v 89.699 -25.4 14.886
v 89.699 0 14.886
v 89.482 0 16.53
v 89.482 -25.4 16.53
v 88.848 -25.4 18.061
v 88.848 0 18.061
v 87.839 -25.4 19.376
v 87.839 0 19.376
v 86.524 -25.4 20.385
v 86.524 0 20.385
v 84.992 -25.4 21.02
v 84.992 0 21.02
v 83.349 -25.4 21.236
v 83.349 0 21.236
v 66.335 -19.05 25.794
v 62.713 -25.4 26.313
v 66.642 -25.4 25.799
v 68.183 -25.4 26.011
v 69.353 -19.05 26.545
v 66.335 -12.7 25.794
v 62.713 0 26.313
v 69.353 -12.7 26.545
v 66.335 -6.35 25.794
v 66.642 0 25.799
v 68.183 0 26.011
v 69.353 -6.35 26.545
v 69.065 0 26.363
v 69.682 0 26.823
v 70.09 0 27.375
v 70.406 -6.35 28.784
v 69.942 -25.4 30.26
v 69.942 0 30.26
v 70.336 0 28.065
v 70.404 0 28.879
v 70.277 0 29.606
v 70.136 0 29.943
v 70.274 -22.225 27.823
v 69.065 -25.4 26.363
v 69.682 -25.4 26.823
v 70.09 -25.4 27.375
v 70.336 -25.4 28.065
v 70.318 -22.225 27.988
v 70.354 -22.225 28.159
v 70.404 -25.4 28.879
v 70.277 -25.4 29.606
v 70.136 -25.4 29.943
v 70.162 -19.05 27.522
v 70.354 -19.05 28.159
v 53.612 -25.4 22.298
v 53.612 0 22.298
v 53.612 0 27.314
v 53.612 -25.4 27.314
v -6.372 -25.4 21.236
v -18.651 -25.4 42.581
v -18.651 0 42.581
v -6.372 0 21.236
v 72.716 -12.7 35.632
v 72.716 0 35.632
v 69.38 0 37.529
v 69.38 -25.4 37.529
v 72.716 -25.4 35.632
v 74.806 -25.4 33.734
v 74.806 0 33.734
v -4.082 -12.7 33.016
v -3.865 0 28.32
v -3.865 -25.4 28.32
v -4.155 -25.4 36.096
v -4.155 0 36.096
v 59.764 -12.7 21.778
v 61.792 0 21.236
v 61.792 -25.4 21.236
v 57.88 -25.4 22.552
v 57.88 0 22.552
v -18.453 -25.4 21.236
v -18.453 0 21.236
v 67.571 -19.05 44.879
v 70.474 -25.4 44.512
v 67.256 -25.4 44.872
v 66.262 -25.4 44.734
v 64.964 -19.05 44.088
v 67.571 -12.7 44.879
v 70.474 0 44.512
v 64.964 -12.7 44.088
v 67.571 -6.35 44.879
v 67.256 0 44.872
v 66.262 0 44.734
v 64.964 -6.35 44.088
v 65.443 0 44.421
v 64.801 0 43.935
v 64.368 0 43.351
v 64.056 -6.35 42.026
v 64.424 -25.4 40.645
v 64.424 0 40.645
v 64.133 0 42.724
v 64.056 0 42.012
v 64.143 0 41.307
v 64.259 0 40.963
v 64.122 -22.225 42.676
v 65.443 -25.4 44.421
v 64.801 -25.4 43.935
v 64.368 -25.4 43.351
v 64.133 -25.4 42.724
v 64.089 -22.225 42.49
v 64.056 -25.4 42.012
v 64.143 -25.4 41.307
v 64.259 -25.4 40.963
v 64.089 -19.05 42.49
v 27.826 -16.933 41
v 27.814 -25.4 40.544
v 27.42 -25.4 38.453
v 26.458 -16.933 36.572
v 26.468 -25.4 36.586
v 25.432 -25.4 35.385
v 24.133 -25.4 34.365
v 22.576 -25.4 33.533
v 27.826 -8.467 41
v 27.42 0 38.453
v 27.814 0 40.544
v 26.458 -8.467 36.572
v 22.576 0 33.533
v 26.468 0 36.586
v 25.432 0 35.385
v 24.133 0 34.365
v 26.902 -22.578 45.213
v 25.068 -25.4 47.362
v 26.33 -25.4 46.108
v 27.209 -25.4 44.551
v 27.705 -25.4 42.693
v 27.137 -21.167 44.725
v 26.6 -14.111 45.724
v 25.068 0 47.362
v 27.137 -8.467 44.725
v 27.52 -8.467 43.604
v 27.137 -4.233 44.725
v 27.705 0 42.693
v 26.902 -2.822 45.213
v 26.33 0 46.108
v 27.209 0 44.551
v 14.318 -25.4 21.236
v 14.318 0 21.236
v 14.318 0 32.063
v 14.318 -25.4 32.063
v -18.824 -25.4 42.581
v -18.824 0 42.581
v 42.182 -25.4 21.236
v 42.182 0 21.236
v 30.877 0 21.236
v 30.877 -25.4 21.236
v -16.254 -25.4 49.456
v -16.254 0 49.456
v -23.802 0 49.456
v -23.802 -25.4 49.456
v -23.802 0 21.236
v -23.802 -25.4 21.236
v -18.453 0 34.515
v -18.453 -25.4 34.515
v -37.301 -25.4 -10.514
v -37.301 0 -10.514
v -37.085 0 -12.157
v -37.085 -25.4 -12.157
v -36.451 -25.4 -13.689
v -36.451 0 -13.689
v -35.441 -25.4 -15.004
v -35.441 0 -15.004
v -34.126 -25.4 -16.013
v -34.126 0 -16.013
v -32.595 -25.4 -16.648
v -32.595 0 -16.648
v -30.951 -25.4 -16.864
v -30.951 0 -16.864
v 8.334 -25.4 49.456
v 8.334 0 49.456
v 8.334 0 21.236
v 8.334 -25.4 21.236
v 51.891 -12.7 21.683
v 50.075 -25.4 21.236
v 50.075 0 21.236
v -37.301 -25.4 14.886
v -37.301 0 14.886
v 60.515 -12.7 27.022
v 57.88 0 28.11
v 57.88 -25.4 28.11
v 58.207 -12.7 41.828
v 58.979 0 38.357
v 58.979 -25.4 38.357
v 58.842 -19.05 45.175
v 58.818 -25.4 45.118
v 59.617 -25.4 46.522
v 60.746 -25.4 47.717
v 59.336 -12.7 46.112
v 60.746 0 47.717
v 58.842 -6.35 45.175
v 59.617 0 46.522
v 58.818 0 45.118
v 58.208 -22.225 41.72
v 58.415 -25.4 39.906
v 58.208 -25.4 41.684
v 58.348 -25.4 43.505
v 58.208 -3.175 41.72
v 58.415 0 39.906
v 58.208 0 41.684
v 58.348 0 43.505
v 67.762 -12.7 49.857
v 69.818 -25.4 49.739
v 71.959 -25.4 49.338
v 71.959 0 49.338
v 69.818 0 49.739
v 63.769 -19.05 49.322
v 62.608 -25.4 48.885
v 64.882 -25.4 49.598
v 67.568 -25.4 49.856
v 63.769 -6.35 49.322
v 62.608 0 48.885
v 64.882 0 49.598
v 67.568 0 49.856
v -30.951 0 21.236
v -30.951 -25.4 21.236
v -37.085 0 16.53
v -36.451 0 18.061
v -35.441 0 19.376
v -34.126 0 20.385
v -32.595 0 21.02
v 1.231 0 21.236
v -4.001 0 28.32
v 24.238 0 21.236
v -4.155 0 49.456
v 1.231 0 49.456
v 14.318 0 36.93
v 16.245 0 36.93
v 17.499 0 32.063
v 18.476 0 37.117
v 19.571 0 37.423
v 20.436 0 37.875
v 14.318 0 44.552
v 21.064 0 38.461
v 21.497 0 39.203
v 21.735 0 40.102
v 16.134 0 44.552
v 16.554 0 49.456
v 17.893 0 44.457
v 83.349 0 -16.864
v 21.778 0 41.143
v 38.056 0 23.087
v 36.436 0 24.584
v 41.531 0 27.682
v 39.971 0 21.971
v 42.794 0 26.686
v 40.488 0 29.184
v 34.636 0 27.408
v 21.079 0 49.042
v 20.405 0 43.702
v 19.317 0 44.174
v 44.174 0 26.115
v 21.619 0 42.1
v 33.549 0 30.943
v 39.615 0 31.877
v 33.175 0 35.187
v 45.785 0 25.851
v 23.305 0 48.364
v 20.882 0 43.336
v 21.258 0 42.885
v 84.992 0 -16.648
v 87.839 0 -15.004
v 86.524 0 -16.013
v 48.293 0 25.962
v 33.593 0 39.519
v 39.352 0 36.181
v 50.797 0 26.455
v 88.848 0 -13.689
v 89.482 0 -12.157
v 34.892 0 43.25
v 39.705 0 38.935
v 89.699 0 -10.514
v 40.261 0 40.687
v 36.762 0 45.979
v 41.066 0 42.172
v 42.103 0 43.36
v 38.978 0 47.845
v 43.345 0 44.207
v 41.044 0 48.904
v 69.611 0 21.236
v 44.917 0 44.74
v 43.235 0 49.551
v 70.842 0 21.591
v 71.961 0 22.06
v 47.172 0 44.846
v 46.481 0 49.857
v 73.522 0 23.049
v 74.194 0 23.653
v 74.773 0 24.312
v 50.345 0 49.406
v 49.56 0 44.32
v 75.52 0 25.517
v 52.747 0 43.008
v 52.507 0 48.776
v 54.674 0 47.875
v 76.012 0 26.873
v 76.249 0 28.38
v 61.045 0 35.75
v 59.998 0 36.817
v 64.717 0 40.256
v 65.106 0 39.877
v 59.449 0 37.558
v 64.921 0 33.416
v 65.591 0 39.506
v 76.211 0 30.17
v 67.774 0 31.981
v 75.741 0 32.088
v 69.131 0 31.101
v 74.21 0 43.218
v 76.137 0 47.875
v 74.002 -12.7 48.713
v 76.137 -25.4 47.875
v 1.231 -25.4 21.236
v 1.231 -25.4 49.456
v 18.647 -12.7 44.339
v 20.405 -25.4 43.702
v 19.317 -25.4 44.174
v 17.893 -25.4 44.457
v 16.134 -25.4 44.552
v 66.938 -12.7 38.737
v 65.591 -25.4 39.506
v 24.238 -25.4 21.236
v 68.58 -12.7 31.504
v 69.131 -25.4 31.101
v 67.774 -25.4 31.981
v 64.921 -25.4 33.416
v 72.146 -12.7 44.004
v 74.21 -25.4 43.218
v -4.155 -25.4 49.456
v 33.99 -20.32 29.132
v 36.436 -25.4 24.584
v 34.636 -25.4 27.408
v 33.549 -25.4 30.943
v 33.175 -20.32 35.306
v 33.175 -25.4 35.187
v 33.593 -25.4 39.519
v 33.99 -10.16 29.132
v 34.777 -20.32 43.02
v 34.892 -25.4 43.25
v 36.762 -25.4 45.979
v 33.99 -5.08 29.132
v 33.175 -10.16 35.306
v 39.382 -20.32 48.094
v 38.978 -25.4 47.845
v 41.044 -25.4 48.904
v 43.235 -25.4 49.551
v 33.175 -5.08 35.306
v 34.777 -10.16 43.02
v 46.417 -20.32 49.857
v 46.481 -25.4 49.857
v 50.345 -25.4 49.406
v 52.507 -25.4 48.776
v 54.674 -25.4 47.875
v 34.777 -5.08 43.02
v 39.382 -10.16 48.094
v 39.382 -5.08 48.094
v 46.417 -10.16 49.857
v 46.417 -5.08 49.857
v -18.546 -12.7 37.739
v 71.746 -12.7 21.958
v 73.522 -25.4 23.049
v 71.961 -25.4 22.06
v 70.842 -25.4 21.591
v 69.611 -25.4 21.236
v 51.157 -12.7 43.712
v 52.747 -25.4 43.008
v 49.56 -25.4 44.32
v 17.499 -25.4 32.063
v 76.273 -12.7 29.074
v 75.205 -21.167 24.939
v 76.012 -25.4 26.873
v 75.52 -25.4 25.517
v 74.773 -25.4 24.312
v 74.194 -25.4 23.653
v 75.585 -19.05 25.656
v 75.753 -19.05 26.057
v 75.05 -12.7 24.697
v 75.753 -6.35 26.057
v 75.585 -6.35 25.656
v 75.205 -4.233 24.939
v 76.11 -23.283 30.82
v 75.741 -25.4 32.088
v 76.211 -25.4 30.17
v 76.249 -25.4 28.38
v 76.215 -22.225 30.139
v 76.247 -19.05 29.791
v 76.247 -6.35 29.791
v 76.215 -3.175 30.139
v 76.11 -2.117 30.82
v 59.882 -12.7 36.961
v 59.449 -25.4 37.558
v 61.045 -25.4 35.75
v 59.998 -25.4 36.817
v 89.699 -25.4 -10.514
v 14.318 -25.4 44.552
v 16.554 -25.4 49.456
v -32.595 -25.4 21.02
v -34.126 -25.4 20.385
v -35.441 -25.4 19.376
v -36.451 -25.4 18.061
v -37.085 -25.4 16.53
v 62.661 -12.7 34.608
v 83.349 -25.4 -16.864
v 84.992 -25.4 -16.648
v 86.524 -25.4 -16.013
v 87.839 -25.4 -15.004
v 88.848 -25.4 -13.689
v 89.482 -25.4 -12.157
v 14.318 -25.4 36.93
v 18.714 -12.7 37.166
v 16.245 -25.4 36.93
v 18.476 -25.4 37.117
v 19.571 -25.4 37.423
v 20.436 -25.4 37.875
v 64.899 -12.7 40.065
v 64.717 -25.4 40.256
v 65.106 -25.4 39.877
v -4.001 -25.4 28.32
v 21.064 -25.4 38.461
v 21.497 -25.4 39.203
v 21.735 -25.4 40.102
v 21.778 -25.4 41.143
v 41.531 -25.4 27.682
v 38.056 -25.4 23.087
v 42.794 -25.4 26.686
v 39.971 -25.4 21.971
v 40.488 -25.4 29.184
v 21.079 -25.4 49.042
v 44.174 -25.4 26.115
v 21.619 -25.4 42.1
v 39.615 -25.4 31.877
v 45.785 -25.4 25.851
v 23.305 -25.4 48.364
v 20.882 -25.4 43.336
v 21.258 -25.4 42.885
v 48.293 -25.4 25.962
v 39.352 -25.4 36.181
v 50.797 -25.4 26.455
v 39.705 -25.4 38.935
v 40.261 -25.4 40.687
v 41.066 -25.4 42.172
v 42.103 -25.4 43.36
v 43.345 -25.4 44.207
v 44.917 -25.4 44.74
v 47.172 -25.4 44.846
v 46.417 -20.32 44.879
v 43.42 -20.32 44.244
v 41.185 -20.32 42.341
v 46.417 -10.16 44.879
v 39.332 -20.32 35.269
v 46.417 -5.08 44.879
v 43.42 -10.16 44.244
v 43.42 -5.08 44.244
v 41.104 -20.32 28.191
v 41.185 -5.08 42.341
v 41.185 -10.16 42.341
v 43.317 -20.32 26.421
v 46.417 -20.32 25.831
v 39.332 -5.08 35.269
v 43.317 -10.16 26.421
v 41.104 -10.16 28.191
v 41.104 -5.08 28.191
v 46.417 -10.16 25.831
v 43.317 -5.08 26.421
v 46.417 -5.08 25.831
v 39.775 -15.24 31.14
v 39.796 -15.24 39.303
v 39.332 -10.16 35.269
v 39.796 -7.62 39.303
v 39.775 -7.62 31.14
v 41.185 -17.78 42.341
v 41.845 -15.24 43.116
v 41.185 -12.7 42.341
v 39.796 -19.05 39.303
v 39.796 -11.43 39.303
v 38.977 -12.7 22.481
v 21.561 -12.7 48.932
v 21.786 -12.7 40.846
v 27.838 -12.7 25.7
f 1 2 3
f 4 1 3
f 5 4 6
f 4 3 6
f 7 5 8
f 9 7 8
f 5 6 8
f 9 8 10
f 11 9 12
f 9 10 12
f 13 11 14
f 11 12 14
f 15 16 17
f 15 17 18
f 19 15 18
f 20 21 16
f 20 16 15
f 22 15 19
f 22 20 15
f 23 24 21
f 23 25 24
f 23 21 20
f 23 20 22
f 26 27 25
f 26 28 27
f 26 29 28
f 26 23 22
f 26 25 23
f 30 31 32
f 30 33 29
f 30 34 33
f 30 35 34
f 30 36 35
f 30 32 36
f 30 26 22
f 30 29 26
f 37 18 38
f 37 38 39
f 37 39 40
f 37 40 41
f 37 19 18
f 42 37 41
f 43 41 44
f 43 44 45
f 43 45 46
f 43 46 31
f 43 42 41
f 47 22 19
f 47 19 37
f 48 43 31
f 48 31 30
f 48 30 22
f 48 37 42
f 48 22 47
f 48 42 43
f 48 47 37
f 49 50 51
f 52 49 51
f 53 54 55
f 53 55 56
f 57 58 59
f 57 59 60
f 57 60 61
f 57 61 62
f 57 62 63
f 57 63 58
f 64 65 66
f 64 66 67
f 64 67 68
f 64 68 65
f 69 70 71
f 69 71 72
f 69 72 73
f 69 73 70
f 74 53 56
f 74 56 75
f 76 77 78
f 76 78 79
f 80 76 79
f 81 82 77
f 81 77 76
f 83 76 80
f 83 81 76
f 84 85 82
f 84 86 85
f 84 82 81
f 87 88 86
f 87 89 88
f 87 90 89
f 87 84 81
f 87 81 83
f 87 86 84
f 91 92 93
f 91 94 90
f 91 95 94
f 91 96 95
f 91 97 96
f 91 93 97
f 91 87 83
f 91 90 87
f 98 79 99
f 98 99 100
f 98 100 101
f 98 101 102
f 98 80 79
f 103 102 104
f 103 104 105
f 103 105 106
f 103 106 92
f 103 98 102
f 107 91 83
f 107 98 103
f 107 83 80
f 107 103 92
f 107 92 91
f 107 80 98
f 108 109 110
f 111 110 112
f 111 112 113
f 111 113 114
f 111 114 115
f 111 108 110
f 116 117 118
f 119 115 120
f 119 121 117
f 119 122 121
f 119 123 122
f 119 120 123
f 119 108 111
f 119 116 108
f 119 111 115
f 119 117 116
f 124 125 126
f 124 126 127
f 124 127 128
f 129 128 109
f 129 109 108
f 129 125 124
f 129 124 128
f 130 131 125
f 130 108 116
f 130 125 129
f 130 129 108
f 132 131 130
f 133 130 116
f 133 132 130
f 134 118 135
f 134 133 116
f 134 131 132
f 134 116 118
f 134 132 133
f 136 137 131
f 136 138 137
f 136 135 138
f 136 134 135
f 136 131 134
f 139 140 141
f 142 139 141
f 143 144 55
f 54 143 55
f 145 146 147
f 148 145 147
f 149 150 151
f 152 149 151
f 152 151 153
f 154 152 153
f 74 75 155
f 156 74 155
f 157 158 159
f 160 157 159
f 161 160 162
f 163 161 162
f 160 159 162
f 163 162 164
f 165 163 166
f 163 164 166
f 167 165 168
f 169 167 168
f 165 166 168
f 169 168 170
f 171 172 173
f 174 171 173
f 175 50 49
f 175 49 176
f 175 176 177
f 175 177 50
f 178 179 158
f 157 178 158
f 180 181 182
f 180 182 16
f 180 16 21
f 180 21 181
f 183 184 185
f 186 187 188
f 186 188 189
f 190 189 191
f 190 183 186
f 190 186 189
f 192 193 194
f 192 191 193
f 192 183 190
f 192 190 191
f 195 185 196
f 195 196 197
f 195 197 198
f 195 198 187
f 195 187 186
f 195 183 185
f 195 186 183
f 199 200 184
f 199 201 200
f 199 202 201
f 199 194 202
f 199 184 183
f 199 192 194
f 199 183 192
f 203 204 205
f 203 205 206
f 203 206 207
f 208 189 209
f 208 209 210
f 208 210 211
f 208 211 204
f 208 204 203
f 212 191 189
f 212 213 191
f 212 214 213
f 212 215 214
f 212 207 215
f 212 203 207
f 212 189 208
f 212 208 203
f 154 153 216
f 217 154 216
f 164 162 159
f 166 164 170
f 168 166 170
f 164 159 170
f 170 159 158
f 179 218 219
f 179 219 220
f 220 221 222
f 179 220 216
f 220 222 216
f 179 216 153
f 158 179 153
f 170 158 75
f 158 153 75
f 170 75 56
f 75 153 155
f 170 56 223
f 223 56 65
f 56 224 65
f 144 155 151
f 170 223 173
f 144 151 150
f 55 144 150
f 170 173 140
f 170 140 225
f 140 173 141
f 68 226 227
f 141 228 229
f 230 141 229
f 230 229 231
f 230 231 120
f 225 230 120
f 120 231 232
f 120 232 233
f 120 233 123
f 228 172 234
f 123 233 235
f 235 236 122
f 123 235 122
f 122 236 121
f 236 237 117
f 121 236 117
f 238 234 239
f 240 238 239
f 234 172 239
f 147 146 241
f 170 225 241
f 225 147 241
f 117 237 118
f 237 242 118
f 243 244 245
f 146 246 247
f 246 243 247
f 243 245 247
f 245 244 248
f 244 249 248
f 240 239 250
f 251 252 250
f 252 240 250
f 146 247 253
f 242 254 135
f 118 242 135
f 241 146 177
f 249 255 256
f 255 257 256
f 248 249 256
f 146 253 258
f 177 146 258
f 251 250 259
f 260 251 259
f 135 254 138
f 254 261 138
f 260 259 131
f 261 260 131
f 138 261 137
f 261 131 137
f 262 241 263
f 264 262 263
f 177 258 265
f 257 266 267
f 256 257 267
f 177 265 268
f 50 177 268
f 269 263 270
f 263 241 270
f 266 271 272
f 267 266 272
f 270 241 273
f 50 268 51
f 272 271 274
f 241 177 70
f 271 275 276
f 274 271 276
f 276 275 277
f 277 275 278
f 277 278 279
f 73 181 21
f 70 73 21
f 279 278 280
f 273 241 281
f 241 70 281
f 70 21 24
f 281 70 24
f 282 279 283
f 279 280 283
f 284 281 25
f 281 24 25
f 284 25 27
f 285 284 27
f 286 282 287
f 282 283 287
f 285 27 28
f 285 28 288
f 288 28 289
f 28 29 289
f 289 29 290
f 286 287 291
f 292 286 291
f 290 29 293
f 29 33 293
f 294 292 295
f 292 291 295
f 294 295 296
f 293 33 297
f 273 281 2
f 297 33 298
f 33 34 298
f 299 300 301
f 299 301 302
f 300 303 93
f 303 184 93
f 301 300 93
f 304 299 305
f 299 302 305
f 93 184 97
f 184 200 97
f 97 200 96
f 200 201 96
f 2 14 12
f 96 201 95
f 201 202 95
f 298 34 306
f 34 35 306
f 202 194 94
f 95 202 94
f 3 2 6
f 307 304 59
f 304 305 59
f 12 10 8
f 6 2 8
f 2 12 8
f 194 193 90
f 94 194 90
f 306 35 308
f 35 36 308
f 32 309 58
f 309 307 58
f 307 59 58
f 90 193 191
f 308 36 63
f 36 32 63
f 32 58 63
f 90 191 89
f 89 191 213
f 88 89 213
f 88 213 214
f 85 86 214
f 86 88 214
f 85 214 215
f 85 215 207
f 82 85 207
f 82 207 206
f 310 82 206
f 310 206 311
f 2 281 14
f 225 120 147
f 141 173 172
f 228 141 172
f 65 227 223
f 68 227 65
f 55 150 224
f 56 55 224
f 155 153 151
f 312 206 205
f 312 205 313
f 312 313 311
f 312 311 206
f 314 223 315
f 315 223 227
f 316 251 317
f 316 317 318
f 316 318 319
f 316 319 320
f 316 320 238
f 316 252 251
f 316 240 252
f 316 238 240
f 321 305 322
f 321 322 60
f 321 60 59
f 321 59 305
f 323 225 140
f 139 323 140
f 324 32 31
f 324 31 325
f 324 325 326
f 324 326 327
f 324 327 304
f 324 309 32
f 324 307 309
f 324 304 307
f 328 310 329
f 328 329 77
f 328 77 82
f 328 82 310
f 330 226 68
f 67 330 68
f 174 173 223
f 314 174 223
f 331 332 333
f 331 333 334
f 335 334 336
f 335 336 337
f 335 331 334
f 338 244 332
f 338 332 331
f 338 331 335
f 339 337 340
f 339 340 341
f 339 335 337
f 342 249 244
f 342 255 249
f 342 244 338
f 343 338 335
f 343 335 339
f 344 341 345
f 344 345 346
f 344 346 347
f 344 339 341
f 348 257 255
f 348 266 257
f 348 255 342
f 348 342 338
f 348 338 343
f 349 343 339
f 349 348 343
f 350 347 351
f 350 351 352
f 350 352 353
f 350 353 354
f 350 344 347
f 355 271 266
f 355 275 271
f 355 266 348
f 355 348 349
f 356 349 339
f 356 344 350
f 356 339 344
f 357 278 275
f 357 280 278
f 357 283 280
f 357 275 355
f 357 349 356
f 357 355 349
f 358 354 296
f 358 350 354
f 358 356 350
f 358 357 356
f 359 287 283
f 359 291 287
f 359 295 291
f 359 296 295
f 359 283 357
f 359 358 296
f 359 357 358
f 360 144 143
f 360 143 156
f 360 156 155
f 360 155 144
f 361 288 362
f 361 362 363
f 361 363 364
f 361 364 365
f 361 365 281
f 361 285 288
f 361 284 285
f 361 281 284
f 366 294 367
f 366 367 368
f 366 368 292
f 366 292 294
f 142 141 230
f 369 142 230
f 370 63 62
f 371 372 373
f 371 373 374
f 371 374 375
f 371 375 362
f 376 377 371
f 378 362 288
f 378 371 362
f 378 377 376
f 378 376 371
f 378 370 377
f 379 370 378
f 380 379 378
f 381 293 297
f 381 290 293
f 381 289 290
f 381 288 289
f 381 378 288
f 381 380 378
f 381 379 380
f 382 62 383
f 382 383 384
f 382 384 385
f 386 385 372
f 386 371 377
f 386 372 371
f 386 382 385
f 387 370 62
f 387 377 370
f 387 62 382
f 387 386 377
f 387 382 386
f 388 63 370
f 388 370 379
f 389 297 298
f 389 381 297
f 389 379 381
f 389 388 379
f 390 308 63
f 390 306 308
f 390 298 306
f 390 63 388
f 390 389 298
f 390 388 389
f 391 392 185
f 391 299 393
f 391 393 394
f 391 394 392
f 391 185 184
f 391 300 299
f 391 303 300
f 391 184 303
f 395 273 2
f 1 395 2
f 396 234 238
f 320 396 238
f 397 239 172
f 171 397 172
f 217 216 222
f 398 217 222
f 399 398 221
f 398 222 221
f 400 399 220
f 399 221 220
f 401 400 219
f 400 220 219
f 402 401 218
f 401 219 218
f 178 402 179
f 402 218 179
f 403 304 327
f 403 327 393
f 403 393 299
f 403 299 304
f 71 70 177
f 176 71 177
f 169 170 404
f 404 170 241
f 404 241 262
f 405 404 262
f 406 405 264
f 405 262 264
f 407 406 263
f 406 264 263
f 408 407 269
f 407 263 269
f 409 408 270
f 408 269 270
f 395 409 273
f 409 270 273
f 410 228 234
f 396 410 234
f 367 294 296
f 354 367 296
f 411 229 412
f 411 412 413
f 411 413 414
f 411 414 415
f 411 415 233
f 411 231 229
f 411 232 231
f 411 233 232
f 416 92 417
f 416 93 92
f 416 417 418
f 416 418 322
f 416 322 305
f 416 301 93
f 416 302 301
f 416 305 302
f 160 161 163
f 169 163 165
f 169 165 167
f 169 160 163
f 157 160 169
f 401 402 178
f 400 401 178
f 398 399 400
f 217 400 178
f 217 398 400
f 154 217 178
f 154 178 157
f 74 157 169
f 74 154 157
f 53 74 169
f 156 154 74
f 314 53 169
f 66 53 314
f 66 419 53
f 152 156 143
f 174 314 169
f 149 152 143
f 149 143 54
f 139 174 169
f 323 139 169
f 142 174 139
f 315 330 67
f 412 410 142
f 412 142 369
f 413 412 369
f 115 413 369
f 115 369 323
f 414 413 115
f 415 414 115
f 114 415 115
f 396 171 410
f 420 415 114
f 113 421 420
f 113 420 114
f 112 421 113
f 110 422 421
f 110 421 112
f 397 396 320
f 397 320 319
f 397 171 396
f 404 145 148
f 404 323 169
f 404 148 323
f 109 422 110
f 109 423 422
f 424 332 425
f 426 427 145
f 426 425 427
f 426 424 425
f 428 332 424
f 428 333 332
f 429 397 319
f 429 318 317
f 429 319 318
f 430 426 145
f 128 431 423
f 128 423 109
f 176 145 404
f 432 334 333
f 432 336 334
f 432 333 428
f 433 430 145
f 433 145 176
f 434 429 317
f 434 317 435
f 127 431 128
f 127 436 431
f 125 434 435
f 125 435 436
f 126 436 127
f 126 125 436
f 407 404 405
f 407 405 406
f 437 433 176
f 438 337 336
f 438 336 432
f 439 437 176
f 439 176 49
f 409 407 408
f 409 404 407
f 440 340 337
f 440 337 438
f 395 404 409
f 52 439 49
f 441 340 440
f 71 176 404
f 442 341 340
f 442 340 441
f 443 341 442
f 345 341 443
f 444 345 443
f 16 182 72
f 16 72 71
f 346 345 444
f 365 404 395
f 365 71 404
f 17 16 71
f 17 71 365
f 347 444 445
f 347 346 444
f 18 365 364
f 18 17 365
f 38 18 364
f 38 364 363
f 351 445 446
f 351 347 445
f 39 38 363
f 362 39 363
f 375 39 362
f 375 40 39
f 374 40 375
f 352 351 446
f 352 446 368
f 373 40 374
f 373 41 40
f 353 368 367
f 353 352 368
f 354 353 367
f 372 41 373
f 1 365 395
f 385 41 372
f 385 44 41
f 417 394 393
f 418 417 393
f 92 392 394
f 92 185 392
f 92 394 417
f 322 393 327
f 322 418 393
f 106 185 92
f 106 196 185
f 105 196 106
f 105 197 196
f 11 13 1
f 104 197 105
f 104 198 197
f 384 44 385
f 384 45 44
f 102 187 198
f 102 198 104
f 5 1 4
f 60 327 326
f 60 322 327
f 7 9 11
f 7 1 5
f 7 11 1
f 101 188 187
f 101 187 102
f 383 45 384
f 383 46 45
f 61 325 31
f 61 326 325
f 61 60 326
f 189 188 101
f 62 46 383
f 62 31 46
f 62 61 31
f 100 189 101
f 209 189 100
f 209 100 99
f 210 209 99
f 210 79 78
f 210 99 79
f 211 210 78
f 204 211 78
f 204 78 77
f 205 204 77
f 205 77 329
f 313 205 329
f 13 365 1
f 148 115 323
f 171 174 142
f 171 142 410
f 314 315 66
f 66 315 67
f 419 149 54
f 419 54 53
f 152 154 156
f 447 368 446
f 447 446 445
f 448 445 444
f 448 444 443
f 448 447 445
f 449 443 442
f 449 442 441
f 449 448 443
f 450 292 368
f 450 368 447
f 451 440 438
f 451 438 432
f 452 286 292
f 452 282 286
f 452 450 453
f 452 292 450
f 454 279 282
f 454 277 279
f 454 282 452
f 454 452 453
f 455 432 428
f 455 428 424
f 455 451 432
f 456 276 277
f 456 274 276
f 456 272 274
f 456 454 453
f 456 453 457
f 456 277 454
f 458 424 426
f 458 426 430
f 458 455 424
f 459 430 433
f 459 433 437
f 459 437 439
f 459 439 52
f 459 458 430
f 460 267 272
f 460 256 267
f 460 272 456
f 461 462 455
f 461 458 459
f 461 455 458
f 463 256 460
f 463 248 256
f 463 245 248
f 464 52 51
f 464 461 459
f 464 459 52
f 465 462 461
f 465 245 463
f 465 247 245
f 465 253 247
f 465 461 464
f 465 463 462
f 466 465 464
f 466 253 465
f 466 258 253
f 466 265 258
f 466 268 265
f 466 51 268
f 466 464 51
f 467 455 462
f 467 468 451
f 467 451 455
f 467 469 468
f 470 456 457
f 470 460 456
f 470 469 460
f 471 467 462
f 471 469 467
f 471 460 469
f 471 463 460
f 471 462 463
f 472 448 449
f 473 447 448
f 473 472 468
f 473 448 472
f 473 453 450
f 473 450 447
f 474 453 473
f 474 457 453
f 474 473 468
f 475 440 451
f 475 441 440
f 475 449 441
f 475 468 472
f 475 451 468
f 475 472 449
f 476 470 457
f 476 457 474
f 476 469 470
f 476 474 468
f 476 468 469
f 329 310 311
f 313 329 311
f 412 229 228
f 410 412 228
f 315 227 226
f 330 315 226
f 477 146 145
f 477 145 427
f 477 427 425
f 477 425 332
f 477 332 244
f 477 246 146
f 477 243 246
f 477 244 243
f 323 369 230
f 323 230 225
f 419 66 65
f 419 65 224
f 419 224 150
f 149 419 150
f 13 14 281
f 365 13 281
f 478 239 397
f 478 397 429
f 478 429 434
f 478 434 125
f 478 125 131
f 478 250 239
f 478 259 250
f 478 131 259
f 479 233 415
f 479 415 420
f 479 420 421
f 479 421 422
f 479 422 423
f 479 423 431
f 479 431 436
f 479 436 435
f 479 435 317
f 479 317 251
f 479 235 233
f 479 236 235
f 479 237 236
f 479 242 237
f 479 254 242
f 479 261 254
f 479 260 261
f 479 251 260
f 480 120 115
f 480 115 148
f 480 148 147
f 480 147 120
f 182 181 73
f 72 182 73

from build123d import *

# Parameters (mm, degrees)
F1_DEPTH = 25.4


with BuildPart() as f1:
    # F0 (on Front) → F1 (new body)
    with BuildSketch(Plane.XZ):
        with BuildLine():
            ThreePointArc((-37.3012647021, -10.5139339946), (-35.4413927627, -15.0040620552), (-30.9512647021, -16.8639339946))
            Line((-30.9512647021, -16.8639339946), (83.3487352979, -16.8639339946))
            ThreePointArc((83.3487352979, -16.8639339946), (87.8388633584, -15.0040620552), (89.6987352979, -10.5139339946))
            Line((89.6987352979, -10.5139339946), (89.6987352979, 14.8860660054))
            ThreePointArc((89.6987352979, 14.8860660054), (87.8388633584, 19.3761940659), (83.3487352979, 21.2360660054))
            Line((83.3487352979, 21.2360660054), (69.6107378608, 21.2360660054))
            add(Edge.make_bspline(
                [(69.6107378608, 21.2360660054), (67.9310832834, 20.846957727), (65.8721436381, 20.846957727)],
                knots=[0.5796214889, 0.5796214889, 0.5796214889, 1, 1, 1], degree=2))
            add(Edge.make_bspline(
                [(65.8721436381, 20.846957727), (63.712128793, 20.846957727), (61.7917820904, 21.2360660054)],
                knots=[0, 0, 0, 0.477766543, 0.477766543, 0.477766543], degree=2))
            Line((61.7917820904, 21.2360660054), (50.0748208435, 21.2360660054))
            add(Edge.make_bspline(
                [(50.0748208435, 21.2360660054), (48.0740341098, 20.846957727), (45.8546844283, 20.846957727)],
                knots=[0.4822306436, 0.4822306436, 0.4822306436, 1, 1, 1], degree=2))
            add(Edge.make_bspline(
                [(45.8546844283, 20.846957727), (43.8675938375, 20.846957727), (42.1821425568, 21.2360660054)],
                knots=[0, 0, 0, 0.3226952609, 0.3226952609, 0.3226952609], degree=2))
            Line((42.1821425568, 21.2360660054), (30.8771038717, 21.2360660054))
            Line((30.8771038717, 21.2360660054), (24.2375578518, 21.2360660054))
            Line((24.2375578518, 21.2360660054), (14.3183849141, 21.2360660054))
            Line((14.3183849141, 21.2360660054), (8.3335290134, 21.2360660054))
            Line((8.3335290134, 21.2360660054), (1.2307588525, 21.2360660054))
            Line((1.2307588525, 21.2360660054), (-6.3722933805, 21.2360660054))
            Line((-6.3722933805, 21.2360660054), (-18.4531789759, 21.2360660054))
            Line((-18.4531789759, 21.2360660054), (-23.8018737231, 21.2360660054))
            Line((-23.8018737231, 21.2360660054), (-30.9512647021, 21.2360660054))
            ThreePointArc((-30.9512647021, 21.2360660054), (-35.4413927627, 19.3761940659), (-37.3012647021, 14.8860660054))
            Line((-37.3012647021, 14.8860660054), (-37.3012647021, -10.5139339946))
        make_face()
        with BuildLine():
            Line((-23.8018737231, 49.4556806705), (-23.8018737231, 21.2360660054))
            Line((-23.8018737231, 21.2360660054), (-18.4531789759, 21.2360660054))
            Line((-18.4531789759, 21.2360660054), (-18.4531789759, 34.5151580452))
            add(Edge.make_bspline(
                [(-18.8237582886, 42.5814344192), (-18.4531789759, 36.9300998999), (-18.4531789759, 34.5151580452)],
                knots=[0, 0, 0, 1, 1, 1], degree=2))
            Line((-18.8237582886, 42.5814344192), (-18.650821276, 42.5814344192))
            Line((-18.650821276, 42.5814344192), (-6.3722933805, 21.2360660054))
            Line((-6.3722933805, 21.2360660054), (1.2307588525, 21.2360660054))
            Line((1.2307588525, 21.2360660054), (1.2307588525, 49.4556806705))
            Line((1.2307588525, 49.4556806705), (-4.154993826, 49.4556806705))
            Line((-4.154993826, 49.4556806705), (-4.154993826, 36.0962964462))
            add(Edge.make_bspline(
                [(-3.8647066977, 28.3203072006), (-4.154993826, 33.8234099948), (-4.154993826, 36.0962964462)],
                knots=[0, 0, 0, 1, 1, 1], degree=2))
            Line((-3.8647066977, 28.3203072006), (-4.000585779, 28.3203072006))
            Line((-4.000585779, 28.3203072006), (-16.2544083869, 49.4556806705))
            Line((-16.2544083869, 49.4556806705), (-23.8018737231, 49.4556806705))
        make_face()
        with BuildLine():
            add(Edge.make_bspline(
                [(69.6107378608, 21.2360660054), (67.9310832834, 20.846957727), (65.8721436381, 20.846957727)],
                knots=[0.5796214889, 0.5796214889, 0.5796214889, 1, 1, 1], degree=2))
            Line((69.6107378608, 21.2360660054), (61.7917820904, 21.2360660054))
            add(Edge.make_bspline(
                [(65.8721436381, 20.846957727), (63.712128793, 20.846957727), (61.7917820904, 21.2360660054)],
                knots=[0, 0, 0, 0.477766543, 0.477766543, 0.477766543], degree=2))
        make_face()
        with BuildLine():
            Line((61.7917820904, 21.2360660054), (69.6107378608, 21.2360660054))
            add(Edge.make_bspline(
                [(73.5215182852, 23.0488164769), (71.9266599676, 21.7725718298), (69.6107378608, 21.2360660054)],
                knots=[0, 0, 0, 0.5796214889, 0.5796214889, 0.5796214889], degree=2))
            add(Edge.make_bspline(
                [(76.2730696823, 29.0738184698), (76.2730696823, 25.2506752267), (73.5215182852, 23.0488164769)],
                knots=[0, 0, 0, 1, 1, 1], degree=2))
            add(Edge.make_bspline(
                [(74.8061932361, 33.7338533275), (76.2730696823, 31.8346343497), (76.2730696823, 29.0738184698)],
                knots=[0, 0, 0, 1, 1, 1], degree=2))
            add(Edge.make_bspline(
                [(69.3802944654, 37.5292031222), (73.3393167898, 35.6330723053), (74.8061932361, 33.7338533275)],
                knots=[0, 0, 0, 1, 1, 1], degree=2))
            add(Edge.make_bspline(
                [(65.5911209926, 39.5056261235), (66.3909546759, 38.9559334762), (69.3802944654, 37.5292031222)],
                knots=[0, 0, 0, 1, 1, 1], degree=2))
            add(Edge.make_bspline(
                [(64.4237961575, 40.6451575101), (64.7912873093, 40.0553187707), (65.5911209926, 39.5056261235)],
                knots=[0, 0, 0, 1, 1, 1], degree=2))
            add(Edge.make_bspline(
                [(64.0563050057, 42.0255654501), (64.0563050057, 41.2349962496), (64.4237961575, 40.6451575101)],
                knots=[0, 0, 0, 1, 1, 1], degree=2))
            add(Edge.make_bspline(
                [(64.9642243219, 44.0884569577), (64.0563050057, 43.2978877572), (64.0563050057, 42.0255654501)],
                knots=[0, 0, 0, 1, 1, 1], degree=2))
            add(Edge.make_bspline(
                [(67.5706321548, 44.8790261582), (65.8721436381, 44.8790261582), (64.9642243219, 44.0884569577)],
                knots=[0, 0, 0, 1, 1, 1], degree=2))
            add(Edge.make_bspline(
                [(70.4735034379, 44.5115350064), (68.9973625089, 44.8790261582), (67.5706321548, 44.8790261582)],
                knots=[0, 0, 0, 1, 1, 1], degree=2))
            add(Edge.make_bspline(
                [(74.2101781747, 43.2175955727), (71.949644367, 44.1440438546), (70.4735034379, 44.5115350064)],
                knots=[0, 0, 0, 1, 1, 1], degree=2))
            Line((74.2101781747, 43.2175955727), (76.137190601, 47.8745422695))
            add(Edge.make_bspline(
                [(71.9589088498, 49.3383305548), (73.9569489777, 48.819519517), (76.137190601, 47.8745422695)],
                knots=[0, 0, 0, 1, 1, 1], degree=2))
            add(Edge.make_bspline(
                [(67.7620981331, 49.8571415927), (69.960868722, 49.8571415927), (71.9589088498, 49.3383305548)],
                knots=[0, 0, 0, 1, 1, 1], degree=2))
            add(Edge.make_bspline(
                [(60.7457964785, 47.7170460616), (63.2842647708, 49.8571415927), (67.7620981331, 49.8571415927)],
                knots=[0, 0, 0, 1, 1, 1], degree=2))
            add(Edge.make_bspline(
                [(58.2073281863, 41.82792315), (58.2073281863, 45.5769505305), (60.7457964785, 47.7170460616)],
                knots=[0, 0, 0, 1, 1, 1], degree=2))
            add(Edge.make_bspline(
                [(58.9793684211, 38.356830254), (58.2073281863, 39.8453238268), (58.2073281863, 41.82792315)],
                knots=[0, 0, 0, 1, 1, 1], degree=2))
            add(Edge.make_bspline(
                [(61.0453480897, 35.750422421), (59.751408656, 36.8683366811), (58.9793684211, 38.356830254)],
                knots=[0, 0, 0, 1, 1, 1], degree=2))
            add(Edge.make_bspline(
                [(64.9209900687, 33.4157727508), (62.3392875233, 34.6325081609), (61.0453480897, 35.750422421)],
                knots=[0, 0, 0, 1, 1, 1], degree=2))
            add(Edge.make_bspline(
                [(68.580460782, 31.5042011292), (67.6818059486, 32.1002161905), (64.9209900687, 33.4157727508)],
                knots=[0, 0, 0, 1, 1, 1], degree=2))
            add(Edge.make_bspline(
                [(69.9423397564, 30.2596722706), (69.4791156154, 30.9081860679), (68.580460782, 31.5042011292)],
                knots=[0, 0, 0, 1, 1, 1], degree=2))
            add(Edge.make_bspline(
                [(70.4055638973, 28.7835313415), (70.4055638973, 29.6111584733), (69.9423397564, 30.2596722706)],
                knots=[0, 0, 0, 1, 1, 1], degree=2))
            add(Edge.make_bspline(
                [(69.3525010169, 26.5446146604), (70.4055638973, 27.2950377687), (70.4055638973, 28.7835313415)],
                knots=[0, 0, 0, 1, 1, 1], degree=2))
            add(Edge.make_bspline(
                [(66.335367779, 25.7941915521), (68.2994381365, 25.7941915521), (69.3525010169, 26.5446146604)],
                knots=[0, 0, 0, 1, 1, 1], degree=2))
            add(Edge.make_bspline(
                [(62.712954997, 26.3130025899), (64.6924661592, 25.7941915521), (66.335367779, 25.7941915521)],
                knots=[0, 0, 0, 1, 1, 1], degree=2))
            add(Edge.make_bspline(
                [(57.8799831267, 28.1103122567), (60.7334438348, 26.8318136278), (62.712954997, 26.3130025899)],
                knots=[0, 0, 0, 1, 1, 1], degree=2))
            Line((57.8799831267, 28.1103122567), (57.8799831267, 22.5516225656))
            add(Edge.make_bspline(
                [(61.7917820904, 21.2360660054), (59.6927039695, 21.6613895538), (57.8799831267, 22.5516225656)],
                knots=[0.477766543, 0.477766543, 0.477766543, 1, 1, 1], degree=2))
        make_face()
        with BuildLine():
            add(Edge.make_bspline(
                [(50.0748208435, 21.2360660054), (48.0740341098, 20.846957727), (45.8546844283, 20.846957727)],
                knots=[0.4822306436, 0.4822306436, 0.4822306436, 1, 1, 1], degree=2))
            Line((50.0748208435, 21.2360660054), (42.1821425568, 21.2360660054))
            add(Edge.make_bspline(
                [(45.8546844283, 20.846957727), (43.8675938375, 20.846957727), (42.1821425568, 21.2360660054)],
                knots=[0, 0, 0, 0.3226952609, 0.3226952609, 0.3226952609], degree=2))
        make_face()
        with BuildLine():
            Line((42.1821425568, 21.2360660054), (50.0748208435, 21.2360660054))
            add(Edge.make_bspline(
                [(53.6121447083, 22.2983933686), (51.9382773469, 21.5984666249), (50.0748208435, 21.2360660054)],
                knots=[0, 0, 0, 0.4822306436, 0.4822306436, 0.4822306436], degree=2))
            Line((53.6121447083, 22.2983933686), (53.6121447083, 27.3135667343))
            add(Edge.make_bspline(
                [(46.4167297193, 25.8312494834), (49.3875405431, 25.8312494834), (53.6121447083, 27.3135667343)],
                knots=[0, 0, 0, 1, 1, 1], degree=2))
            add(Edge.make_bspline(
                [(39.332488524, 35.2686693145), (39.332488524, 25.8312494834), (46.4167297193, 25.8312494834)],
                knots=[0, 0, 0, 1, 1, 1], degree=2))
            add(Edge.make_bspline(
                [(41.1853850877, 42.3405578659), (39.332488524, 39.8020895736), (39.332488524, 35.2686693145)],
                knots=[0, 0, 0, 1, 1, 1], degree=2))
            add(Edge.make_bspline(
                [(46.4167297193, 44.8790261582), (43.0382816514, 44.8790261582), (41.1853850877, 42.3405578659)],
                knots=[0, 0, 0, 1, 1, 1], degree=2))
            add(Edge.make_bspline(
                [(49.5604775557, 44.3200690281), (47.960810189, 44.8790261582), (46.4167297193, 44.8790261582)],
                knots=[0, 0, 0, 1, 1, 1], degree=2))
            add(Edge.make_bspline(
                [(52.7474596452, 43.0076006288), (51.1601449223, 43.7611118981), (49.5604775557, 44.3200690281)],
                knots=[0, 0, 0, 1, 1, 1], degree=2))
            Line((52.7474596452, 43.0076006288), (54.6744720715, 47.8745422695))
            add(Edge.make_bspline(
                [(46.4167297193, 49.8571415927), (50.5239837688, 49.8571415927), (54.6744720715, 47.8745422695)],
                knots=[0, 0, 0, 1, 1, 1], degree=2))
            add(Edge.make_bspline(
                [(39.3818990991, 48.0938016962), (42.3835915323, 49.8571415927), (46.4167297193, 49.8571415927)],
                knots=[0, 0, 0, 1, 1, 1], degree=2))
            add(Edge.make_bspline(
                [(34.7774511383, 43.0199532726), (36.3802066659, 46.3304617997), (39.3818990991, 48.0938016962)],
                knots=[0, 0, 0, 1, 1, 1], degree=2))
            add(Edge.make_bspline(
                [(33.1746956107, 35.3057272457), (33.1746956107, 39.7094447455), (34.7774511383, 43.0199532726)],
                knots=[0, 0, 0, 1, 1, 1], degree=2))
            add(Edge.make_bspline(
                [(36.4357935628, 24.5836324638), (33.1746956107, 28.3203072006), (33.1746956107, 35.3057272457)],
                knots=[0, 0, 0, 1, 1, 1], degree=2))
            add(Edge.make_bspline(
                [(42.1821425568, 21.2360660054), (38.6445506604, 22.0527649561), (36.4357935628, 24.5836324638)],
                knots=[0.3226952609, 0.3226952609, 0.3226952609, 1, 1, 1], degree=2))
        make_face()
        with BuildLine():
            Line((8.3335290134, 49.4556806705), (8.3335290134, 21.2360660054))
            Line((8.3335290134, 21.2360660054), (14.3183849141, 21.2360660054))
            Line((14.3183849141, 21.2360660054), (14.3183849141, 32.0631582593))
            Line((14.3183849141, 32.0631582593), (17.4991906818, 32.0631582593))
            Line((17.4991906818, 32.0631582593), (24.2375578518, 21.2360660054))
            Line((24.2375578518, 21.2360660054), (30.8771038717, 21.2360660054))
            add(Edge.make_bspline(
                [(22.5761272663, 33.5331228665), (28.9500914454, 24.0154108509), (30.8771038717, 21.2360660054)],
                knots=[0, 0, 0, 1, 1, 1], degree=2))
            add(Edge.make_bspline(
                [(26.4579455673, 36.5718732309), (25.0898902711, 34.6325081609), (22.5761272663, 33.5331228665)],
                knots=[0, 0, 0, 1, 1, 1], degree=2))
            add(Edge.make_bspline(
                [(27.8260008635, 41.0002960182), (27.8260008635, 38.5112383009), (26.4579455673, 36.5718732309)],
                knots=[0, 0, 0, 1, 1, 1], degree=2))
            add(Edge.make_bspline(
                [(25.0682731445, 47.3619075535), (27.8260008635, 45.2681344366), (27.8260008635, 41.0002960182)],
                knots=[0, 0, 0, 1, 1, 1], degree=2))
            add(Edge.make_bspline(
                [(16.5542134343, 49.4556806705), (22.3105454255, 49.4556806705), (25.0682731445, 47.3619075535)],
                knots=[0, 0, 0, 1, 1, 1], degree=2))
            Line((16.5542134343, 49.4556806705), (8.3335290134, 49.4556806705))
        make_face()
        with BuildLine():
            Line((16.2453973404, 36.9300998999), (14.3183849141, 36.9300998999))
            Line((14.3183849141, 36.9300998999), (14.3183849141, 44.5516810986))
            Line((14.3183849141, 44.5516810986), (16.1342235465, 44.5516810986))
            add(Edge.make_bspline(
                [(20.4051501259, 43.7024368402), (19.0247421859, 44.5516810986), (16.1342235465, 44.5516810986)],
                knots=[0, 0, 0, 1, 1, 1], degree=2))
            add(Edge.make_bspline(
                [(21.7855580658, 40.8458879712), (21.7855580658, 42.8531925819), (20.4051501259, 43.7024368402)],
                knots=[0, 0, 0, 1, 1, 1], degree=2))
            add(Edge.make_bspline(
                [(20.4360317353, 37.8750771474), (21.7855580658, 38.8200543949), (21.7855580658, 40.8458879712)],
                knots=[0, 0, 0, 1, 1, 1], degree=2))
            add(Edge.make_bspline(
                [(16.2453973404, 36.9300998999), (19.0865054047, 36.9300998999), (20.4360317353, 37.8750771474)],
                knots=[0, 0, 0, 1, 1, 1], degree=2))
        make_face(mode=Mode.SUBTRACT)
    extrude(amount=F1_DEPTH)


solid = f1.part
